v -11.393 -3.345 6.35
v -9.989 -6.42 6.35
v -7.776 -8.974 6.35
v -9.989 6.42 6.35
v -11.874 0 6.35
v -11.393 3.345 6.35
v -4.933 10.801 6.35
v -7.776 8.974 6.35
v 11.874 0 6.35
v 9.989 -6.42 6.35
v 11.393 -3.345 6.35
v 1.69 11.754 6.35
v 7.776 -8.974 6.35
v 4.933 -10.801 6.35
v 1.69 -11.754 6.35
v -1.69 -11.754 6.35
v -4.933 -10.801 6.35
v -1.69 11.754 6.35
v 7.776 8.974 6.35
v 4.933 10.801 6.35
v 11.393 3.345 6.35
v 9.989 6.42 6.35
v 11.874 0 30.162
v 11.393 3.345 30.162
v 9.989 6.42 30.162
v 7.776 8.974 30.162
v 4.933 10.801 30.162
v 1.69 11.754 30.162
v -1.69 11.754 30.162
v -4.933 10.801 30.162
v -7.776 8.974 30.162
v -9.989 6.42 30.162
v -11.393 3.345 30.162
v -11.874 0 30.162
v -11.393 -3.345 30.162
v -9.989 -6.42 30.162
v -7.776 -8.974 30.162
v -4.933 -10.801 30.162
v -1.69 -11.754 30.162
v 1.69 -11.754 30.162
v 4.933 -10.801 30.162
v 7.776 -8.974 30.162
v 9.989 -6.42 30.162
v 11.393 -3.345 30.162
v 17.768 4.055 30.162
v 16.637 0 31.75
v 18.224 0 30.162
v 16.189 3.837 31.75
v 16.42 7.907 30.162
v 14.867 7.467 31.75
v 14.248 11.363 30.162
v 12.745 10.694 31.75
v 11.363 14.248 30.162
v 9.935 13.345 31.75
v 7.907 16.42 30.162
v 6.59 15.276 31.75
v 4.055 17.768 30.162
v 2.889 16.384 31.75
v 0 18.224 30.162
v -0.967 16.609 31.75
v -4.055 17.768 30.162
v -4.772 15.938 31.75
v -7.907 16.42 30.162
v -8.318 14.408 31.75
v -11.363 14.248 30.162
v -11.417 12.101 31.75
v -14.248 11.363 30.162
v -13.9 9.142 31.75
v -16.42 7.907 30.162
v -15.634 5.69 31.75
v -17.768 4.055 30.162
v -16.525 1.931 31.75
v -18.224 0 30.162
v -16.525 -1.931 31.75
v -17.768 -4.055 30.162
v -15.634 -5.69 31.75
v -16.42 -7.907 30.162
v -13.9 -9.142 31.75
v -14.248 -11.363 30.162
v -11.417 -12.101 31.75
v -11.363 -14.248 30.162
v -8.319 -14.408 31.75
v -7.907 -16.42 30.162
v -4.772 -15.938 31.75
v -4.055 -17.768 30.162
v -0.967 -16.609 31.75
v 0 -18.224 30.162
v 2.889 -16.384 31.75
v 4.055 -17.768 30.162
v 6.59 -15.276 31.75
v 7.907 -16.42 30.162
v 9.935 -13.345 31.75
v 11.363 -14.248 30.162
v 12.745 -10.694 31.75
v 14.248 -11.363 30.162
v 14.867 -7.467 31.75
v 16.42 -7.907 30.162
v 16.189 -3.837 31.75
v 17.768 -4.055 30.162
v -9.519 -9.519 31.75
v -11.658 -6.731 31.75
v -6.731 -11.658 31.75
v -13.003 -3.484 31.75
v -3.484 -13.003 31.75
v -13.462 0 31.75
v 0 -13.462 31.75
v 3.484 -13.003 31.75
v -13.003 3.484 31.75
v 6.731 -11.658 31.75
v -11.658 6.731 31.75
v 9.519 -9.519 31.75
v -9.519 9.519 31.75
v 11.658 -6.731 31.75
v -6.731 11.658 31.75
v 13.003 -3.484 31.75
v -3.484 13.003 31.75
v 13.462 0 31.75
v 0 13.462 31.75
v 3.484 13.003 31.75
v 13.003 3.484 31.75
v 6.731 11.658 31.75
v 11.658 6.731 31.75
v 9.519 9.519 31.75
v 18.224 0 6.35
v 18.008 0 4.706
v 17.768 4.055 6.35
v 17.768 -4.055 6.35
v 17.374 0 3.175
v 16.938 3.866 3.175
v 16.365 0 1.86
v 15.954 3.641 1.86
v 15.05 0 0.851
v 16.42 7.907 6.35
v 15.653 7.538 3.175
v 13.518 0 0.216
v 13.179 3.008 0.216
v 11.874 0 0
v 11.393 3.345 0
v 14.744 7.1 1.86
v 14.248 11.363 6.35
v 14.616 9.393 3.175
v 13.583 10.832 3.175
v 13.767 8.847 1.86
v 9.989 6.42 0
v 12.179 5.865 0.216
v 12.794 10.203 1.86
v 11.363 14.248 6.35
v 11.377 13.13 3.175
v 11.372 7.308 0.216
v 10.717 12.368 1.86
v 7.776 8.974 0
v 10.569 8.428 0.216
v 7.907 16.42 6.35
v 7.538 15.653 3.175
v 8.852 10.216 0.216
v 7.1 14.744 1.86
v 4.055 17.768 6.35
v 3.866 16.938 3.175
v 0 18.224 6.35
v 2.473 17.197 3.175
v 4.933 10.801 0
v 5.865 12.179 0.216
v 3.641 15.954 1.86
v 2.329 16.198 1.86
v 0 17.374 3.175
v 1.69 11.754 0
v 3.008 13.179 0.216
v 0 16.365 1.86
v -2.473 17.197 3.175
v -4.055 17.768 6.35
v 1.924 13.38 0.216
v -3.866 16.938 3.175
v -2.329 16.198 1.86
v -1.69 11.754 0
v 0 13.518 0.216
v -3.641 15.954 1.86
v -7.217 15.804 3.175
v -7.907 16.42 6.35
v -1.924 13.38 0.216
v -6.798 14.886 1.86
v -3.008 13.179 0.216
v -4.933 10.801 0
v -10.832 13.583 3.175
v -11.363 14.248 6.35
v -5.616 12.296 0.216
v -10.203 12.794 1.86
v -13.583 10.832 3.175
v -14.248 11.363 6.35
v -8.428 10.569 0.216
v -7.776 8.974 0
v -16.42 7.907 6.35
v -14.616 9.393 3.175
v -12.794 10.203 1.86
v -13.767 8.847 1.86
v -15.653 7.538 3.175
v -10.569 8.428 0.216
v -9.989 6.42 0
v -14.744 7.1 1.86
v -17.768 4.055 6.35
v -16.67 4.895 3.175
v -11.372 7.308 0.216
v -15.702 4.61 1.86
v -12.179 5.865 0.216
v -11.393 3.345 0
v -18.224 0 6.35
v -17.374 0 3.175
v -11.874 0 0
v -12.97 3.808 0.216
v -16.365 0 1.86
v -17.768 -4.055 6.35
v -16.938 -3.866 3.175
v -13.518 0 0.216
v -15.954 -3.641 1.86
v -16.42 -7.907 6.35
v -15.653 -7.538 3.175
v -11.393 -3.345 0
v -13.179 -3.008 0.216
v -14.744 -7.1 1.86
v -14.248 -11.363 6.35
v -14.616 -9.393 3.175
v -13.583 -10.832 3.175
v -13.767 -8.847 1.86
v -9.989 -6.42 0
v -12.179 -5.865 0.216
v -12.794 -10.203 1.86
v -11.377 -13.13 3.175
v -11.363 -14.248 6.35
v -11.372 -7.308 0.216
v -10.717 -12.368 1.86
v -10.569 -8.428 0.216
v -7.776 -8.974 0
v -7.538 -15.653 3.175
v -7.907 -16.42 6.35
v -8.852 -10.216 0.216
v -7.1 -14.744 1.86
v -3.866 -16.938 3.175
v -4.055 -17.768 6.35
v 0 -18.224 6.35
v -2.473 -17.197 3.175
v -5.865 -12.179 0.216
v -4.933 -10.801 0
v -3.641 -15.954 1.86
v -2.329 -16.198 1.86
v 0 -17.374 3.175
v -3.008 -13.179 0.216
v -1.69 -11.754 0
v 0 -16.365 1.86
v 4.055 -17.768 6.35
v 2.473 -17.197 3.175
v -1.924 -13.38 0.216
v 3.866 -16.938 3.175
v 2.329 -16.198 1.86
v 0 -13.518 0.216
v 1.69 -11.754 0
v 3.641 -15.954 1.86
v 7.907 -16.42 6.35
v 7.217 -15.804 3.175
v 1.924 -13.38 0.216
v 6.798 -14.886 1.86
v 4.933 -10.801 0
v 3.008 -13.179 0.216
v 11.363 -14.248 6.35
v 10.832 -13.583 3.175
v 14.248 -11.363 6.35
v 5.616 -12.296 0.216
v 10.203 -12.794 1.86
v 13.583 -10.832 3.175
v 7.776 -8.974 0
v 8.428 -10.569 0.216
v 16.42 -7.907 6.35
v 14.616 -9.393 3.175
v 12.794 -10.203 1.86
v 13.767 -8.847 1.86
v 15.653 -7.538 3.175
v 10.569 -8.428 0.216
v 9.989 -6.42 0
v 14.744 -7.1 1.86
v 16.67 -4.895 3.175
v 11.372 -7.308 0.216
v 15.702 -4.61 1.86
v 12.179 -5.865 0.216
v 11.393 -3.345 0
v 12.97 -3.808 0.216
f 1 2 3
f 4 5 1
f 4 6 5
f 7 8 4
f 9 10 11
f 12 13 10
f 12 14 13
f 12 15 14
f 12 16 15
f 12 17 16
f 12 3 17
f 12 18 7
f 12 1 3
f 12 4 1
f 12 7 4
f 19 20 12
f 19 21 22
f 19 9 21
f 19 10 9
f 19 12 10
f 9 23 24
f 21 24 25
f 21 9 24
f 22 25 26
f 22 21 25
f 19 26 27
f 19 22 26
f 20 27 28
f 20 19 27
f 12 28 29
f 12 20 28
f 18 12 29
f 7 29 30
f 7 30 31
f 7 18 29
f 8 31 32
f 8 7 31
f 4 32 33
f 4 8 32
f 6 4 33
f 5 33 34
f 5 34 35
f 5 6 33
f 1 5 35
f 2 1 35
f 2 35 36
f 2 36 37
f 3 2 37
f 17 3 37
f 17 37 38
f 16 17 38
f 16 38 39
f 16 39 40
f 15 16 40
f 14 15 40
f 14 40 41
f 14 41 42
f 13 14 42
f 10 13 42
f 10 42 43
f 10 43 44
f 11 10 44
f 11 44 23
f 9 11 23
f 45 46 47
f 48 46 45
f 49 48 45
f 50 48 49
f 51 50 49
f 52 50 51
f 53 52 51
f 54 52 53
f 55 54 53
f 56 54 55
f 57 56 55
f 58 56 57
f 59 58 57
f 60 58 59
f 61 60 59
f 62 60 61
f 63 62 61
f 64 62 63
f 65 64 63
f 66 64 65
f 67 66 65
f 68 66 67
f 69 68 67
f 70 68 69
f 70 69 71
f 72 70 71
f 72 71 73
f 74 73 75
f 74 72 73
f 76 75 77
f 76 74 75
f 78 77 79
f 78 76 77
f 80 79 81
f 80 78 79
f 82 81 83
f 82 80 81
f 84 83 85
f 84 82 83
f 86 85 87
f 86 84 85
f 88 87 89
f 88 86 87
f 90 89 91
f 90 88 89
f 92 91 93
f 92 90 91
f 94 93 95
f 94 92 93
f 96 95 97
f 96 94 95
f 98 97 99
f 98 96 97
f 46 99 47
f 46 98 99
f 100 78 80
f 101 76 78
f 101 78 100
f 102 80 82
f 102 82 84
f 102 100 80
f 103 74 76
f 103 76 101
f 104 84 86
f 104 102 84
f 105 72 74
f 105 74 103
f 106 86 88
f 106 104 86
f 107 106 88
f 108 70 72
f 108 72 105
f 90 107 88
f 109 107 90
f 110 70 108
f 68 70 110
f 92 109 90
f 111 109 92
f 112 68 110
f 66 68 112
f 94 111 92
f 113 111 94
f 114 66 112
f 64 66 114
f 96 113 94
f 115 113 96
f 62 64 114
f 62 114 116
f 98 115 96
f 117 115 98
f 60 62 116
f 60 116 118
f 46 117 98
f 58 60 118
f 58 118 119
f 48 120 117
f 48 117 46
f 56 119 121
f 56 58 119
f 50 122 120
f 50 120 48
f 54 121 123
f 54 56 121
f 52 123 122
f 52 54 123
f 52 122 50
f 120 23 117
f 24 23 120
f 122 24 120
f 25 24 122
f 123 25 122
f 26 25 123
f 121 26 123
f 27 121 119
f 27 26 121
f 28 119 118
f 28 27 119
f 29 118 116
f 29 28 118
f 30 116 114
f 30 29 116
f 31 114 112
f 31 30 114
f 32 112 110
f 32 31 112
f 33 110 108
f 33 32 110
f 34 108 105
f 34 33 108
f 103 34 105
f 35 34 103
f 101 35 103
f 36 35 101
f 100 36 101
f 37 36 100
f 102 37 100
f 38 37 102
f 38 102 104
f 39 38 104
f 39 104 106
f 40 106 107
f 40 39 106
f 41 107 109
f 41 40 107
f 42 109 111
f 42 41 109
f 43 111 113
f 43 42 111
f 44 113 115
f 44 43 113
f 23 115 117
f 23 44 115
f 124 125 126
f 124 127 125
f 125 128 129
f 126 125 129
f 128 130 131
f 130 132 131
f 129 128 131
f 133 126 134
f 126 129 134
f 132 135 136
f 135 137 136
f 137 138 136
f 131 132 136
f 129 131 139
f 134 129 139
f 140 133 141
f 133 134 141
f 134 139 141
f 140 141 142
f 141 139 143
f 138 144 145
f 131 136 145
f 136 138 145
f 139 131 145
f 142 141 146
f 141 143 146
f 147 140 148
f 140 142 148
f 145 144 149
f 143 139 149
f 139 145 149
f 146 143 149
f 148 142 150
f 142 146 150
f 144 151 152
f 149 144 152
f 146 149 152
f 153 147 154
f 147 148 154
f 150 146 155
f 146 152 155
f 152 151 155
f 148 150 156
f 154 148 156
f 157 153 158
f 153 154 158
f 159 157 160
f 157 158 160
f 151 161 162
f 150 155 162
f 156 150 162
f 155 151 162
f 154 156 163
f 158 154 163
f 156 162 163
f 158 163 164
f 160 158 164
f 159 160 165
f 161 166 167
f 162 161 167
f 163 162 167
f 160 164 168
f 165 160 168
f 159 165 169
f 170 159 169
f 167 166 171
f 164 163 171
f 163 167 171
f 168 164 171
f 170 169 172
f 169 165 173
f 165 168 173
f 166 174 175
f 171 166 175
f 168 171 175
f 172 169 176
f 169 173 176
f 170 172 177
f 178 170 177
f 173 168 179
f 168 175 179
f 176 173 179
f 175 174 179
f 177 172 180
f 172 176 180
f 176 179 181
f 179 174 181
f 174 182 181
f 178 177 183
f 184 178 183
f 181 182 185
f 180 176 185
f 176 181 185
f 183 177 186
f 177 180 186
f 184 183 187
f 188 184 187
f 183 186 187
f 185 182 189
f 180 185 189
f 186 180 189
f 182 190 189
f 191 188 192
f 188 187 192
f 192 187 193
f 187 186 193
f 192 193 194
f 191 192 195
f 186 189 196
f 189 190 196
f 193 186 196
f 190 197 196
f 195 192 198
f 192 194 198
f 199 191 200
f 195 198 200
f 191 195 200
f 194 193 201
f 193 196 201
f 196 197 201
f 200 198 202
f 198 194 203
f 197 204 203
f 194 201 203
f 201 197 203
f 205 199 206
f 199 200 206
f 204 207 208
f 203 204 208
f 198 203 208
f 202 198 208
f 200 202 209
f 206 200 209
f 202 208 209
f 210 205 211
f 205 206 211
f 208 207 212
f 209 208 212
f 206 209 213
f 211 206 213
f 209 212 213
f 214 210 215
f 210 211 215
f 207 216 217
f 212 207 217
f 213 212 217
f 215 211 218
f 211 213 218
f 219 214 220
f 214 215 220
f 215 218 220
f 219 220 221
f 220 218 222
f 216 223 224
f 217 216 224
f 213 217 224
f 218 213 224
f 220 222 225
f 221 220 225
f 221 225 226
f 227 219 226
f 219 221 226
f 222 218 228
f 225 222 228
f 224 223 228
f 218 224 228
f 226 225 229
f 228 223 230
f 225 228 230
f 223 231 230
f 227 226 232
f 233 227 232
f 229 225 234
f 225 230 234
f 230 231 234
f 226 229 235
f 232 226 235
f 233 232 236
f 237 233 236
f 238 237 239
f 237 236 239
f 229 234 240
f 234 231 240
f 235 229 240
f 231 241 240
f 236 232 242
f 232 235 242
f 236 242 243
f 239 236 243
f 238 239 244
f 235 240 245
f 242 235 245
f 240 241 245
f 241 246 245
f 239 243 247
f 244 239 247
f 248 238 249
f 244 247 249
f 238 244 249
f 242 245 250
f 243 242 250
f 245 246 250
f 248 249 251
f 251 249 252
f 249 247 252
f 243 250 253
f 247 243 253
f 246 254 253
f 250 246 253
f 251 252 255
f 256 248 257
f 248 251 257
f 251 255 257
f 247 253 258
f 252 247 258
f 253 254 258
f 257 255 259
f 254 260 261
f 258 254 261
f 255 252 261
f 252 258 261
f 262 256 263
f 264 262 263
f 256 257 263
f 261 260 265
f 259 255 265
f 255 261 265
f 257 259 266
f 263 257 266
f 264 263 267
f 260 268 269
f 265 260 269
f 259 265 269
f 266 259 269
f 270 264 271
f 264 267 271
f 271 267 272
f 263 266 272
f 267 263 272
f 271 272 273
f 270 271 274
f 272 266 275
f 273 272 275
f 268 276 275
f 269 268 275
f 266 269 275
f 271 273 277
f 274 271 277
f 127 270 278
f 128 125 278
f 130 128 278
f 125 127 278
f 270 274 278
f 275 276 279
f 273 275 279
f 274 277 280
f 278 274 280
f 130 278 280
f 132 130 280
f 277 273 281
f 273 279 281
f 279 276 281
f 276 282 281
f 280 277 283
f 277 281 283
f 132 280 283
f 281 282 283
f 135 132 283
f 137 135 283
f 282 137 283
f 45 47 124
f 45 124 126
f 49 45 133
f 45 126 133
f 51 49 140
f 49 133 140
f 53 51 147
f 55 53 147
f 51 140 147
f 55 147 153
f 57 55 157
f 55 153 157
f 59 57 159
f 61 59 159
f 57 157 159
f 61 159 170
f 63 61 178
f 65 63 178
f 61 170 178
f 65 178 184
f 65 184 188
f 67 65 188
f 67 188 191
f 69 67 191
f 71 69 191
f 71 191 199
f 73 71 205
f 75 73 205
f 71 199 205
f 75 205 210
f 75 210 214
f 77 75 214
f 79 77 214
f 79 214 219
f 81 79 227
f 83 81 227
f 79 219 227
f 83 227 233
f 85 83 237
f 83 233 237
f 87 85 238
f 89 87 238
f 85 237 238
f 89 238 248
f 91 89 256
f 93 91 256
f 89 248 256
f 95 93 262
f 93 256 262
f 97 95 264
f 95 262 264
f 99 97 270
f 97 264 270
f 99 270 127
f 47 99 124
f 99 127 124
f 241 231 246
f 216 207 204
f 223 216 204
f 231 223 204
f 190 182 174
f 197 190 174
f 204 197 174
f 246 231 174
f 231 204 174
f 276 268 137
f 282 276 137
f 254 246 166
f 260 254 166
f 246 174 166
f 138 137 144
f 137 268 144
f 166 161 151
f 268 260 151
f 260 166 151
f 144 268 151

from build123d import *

# Parameters (mm, degrees)
F0_R     = 18.2245
F1_DEPTH = 31.75
F2_T     = -6.35
F3_R     = 6.35
F4_SIZE  = 1.5875


with BuildPart() as f1:
    # F0 (on Top) → F1 (new body)
    with BuildSketch(Plane.XY):
        Circle(F0_R)
    extrude(amount=F1_DEPTH)

    # F2
    f2_openings = [f1.faces().sort_by_distance(p)[0] for p in [
        (0, 0, 31.75),
    ]]
    offset(amount=F2_T, openings=f2_openings)

    # F3
    f3_edges = [f1.edges().sort_by_distance(p)[0] for p in [
        (-18.2245, 0, 0),
    ]]
    fillet(f3_edges, radius=F3_R)

    # F4
    f4_edges = [f1.edges().sort_by_distance(p)[0] for p in [
        (-18.2245, 0, 31.75),
        (-11.8745, 0, 31.75),
    ]]
    chamfer(f4_edges, length=F4_SIZE)


solid = f1.part
